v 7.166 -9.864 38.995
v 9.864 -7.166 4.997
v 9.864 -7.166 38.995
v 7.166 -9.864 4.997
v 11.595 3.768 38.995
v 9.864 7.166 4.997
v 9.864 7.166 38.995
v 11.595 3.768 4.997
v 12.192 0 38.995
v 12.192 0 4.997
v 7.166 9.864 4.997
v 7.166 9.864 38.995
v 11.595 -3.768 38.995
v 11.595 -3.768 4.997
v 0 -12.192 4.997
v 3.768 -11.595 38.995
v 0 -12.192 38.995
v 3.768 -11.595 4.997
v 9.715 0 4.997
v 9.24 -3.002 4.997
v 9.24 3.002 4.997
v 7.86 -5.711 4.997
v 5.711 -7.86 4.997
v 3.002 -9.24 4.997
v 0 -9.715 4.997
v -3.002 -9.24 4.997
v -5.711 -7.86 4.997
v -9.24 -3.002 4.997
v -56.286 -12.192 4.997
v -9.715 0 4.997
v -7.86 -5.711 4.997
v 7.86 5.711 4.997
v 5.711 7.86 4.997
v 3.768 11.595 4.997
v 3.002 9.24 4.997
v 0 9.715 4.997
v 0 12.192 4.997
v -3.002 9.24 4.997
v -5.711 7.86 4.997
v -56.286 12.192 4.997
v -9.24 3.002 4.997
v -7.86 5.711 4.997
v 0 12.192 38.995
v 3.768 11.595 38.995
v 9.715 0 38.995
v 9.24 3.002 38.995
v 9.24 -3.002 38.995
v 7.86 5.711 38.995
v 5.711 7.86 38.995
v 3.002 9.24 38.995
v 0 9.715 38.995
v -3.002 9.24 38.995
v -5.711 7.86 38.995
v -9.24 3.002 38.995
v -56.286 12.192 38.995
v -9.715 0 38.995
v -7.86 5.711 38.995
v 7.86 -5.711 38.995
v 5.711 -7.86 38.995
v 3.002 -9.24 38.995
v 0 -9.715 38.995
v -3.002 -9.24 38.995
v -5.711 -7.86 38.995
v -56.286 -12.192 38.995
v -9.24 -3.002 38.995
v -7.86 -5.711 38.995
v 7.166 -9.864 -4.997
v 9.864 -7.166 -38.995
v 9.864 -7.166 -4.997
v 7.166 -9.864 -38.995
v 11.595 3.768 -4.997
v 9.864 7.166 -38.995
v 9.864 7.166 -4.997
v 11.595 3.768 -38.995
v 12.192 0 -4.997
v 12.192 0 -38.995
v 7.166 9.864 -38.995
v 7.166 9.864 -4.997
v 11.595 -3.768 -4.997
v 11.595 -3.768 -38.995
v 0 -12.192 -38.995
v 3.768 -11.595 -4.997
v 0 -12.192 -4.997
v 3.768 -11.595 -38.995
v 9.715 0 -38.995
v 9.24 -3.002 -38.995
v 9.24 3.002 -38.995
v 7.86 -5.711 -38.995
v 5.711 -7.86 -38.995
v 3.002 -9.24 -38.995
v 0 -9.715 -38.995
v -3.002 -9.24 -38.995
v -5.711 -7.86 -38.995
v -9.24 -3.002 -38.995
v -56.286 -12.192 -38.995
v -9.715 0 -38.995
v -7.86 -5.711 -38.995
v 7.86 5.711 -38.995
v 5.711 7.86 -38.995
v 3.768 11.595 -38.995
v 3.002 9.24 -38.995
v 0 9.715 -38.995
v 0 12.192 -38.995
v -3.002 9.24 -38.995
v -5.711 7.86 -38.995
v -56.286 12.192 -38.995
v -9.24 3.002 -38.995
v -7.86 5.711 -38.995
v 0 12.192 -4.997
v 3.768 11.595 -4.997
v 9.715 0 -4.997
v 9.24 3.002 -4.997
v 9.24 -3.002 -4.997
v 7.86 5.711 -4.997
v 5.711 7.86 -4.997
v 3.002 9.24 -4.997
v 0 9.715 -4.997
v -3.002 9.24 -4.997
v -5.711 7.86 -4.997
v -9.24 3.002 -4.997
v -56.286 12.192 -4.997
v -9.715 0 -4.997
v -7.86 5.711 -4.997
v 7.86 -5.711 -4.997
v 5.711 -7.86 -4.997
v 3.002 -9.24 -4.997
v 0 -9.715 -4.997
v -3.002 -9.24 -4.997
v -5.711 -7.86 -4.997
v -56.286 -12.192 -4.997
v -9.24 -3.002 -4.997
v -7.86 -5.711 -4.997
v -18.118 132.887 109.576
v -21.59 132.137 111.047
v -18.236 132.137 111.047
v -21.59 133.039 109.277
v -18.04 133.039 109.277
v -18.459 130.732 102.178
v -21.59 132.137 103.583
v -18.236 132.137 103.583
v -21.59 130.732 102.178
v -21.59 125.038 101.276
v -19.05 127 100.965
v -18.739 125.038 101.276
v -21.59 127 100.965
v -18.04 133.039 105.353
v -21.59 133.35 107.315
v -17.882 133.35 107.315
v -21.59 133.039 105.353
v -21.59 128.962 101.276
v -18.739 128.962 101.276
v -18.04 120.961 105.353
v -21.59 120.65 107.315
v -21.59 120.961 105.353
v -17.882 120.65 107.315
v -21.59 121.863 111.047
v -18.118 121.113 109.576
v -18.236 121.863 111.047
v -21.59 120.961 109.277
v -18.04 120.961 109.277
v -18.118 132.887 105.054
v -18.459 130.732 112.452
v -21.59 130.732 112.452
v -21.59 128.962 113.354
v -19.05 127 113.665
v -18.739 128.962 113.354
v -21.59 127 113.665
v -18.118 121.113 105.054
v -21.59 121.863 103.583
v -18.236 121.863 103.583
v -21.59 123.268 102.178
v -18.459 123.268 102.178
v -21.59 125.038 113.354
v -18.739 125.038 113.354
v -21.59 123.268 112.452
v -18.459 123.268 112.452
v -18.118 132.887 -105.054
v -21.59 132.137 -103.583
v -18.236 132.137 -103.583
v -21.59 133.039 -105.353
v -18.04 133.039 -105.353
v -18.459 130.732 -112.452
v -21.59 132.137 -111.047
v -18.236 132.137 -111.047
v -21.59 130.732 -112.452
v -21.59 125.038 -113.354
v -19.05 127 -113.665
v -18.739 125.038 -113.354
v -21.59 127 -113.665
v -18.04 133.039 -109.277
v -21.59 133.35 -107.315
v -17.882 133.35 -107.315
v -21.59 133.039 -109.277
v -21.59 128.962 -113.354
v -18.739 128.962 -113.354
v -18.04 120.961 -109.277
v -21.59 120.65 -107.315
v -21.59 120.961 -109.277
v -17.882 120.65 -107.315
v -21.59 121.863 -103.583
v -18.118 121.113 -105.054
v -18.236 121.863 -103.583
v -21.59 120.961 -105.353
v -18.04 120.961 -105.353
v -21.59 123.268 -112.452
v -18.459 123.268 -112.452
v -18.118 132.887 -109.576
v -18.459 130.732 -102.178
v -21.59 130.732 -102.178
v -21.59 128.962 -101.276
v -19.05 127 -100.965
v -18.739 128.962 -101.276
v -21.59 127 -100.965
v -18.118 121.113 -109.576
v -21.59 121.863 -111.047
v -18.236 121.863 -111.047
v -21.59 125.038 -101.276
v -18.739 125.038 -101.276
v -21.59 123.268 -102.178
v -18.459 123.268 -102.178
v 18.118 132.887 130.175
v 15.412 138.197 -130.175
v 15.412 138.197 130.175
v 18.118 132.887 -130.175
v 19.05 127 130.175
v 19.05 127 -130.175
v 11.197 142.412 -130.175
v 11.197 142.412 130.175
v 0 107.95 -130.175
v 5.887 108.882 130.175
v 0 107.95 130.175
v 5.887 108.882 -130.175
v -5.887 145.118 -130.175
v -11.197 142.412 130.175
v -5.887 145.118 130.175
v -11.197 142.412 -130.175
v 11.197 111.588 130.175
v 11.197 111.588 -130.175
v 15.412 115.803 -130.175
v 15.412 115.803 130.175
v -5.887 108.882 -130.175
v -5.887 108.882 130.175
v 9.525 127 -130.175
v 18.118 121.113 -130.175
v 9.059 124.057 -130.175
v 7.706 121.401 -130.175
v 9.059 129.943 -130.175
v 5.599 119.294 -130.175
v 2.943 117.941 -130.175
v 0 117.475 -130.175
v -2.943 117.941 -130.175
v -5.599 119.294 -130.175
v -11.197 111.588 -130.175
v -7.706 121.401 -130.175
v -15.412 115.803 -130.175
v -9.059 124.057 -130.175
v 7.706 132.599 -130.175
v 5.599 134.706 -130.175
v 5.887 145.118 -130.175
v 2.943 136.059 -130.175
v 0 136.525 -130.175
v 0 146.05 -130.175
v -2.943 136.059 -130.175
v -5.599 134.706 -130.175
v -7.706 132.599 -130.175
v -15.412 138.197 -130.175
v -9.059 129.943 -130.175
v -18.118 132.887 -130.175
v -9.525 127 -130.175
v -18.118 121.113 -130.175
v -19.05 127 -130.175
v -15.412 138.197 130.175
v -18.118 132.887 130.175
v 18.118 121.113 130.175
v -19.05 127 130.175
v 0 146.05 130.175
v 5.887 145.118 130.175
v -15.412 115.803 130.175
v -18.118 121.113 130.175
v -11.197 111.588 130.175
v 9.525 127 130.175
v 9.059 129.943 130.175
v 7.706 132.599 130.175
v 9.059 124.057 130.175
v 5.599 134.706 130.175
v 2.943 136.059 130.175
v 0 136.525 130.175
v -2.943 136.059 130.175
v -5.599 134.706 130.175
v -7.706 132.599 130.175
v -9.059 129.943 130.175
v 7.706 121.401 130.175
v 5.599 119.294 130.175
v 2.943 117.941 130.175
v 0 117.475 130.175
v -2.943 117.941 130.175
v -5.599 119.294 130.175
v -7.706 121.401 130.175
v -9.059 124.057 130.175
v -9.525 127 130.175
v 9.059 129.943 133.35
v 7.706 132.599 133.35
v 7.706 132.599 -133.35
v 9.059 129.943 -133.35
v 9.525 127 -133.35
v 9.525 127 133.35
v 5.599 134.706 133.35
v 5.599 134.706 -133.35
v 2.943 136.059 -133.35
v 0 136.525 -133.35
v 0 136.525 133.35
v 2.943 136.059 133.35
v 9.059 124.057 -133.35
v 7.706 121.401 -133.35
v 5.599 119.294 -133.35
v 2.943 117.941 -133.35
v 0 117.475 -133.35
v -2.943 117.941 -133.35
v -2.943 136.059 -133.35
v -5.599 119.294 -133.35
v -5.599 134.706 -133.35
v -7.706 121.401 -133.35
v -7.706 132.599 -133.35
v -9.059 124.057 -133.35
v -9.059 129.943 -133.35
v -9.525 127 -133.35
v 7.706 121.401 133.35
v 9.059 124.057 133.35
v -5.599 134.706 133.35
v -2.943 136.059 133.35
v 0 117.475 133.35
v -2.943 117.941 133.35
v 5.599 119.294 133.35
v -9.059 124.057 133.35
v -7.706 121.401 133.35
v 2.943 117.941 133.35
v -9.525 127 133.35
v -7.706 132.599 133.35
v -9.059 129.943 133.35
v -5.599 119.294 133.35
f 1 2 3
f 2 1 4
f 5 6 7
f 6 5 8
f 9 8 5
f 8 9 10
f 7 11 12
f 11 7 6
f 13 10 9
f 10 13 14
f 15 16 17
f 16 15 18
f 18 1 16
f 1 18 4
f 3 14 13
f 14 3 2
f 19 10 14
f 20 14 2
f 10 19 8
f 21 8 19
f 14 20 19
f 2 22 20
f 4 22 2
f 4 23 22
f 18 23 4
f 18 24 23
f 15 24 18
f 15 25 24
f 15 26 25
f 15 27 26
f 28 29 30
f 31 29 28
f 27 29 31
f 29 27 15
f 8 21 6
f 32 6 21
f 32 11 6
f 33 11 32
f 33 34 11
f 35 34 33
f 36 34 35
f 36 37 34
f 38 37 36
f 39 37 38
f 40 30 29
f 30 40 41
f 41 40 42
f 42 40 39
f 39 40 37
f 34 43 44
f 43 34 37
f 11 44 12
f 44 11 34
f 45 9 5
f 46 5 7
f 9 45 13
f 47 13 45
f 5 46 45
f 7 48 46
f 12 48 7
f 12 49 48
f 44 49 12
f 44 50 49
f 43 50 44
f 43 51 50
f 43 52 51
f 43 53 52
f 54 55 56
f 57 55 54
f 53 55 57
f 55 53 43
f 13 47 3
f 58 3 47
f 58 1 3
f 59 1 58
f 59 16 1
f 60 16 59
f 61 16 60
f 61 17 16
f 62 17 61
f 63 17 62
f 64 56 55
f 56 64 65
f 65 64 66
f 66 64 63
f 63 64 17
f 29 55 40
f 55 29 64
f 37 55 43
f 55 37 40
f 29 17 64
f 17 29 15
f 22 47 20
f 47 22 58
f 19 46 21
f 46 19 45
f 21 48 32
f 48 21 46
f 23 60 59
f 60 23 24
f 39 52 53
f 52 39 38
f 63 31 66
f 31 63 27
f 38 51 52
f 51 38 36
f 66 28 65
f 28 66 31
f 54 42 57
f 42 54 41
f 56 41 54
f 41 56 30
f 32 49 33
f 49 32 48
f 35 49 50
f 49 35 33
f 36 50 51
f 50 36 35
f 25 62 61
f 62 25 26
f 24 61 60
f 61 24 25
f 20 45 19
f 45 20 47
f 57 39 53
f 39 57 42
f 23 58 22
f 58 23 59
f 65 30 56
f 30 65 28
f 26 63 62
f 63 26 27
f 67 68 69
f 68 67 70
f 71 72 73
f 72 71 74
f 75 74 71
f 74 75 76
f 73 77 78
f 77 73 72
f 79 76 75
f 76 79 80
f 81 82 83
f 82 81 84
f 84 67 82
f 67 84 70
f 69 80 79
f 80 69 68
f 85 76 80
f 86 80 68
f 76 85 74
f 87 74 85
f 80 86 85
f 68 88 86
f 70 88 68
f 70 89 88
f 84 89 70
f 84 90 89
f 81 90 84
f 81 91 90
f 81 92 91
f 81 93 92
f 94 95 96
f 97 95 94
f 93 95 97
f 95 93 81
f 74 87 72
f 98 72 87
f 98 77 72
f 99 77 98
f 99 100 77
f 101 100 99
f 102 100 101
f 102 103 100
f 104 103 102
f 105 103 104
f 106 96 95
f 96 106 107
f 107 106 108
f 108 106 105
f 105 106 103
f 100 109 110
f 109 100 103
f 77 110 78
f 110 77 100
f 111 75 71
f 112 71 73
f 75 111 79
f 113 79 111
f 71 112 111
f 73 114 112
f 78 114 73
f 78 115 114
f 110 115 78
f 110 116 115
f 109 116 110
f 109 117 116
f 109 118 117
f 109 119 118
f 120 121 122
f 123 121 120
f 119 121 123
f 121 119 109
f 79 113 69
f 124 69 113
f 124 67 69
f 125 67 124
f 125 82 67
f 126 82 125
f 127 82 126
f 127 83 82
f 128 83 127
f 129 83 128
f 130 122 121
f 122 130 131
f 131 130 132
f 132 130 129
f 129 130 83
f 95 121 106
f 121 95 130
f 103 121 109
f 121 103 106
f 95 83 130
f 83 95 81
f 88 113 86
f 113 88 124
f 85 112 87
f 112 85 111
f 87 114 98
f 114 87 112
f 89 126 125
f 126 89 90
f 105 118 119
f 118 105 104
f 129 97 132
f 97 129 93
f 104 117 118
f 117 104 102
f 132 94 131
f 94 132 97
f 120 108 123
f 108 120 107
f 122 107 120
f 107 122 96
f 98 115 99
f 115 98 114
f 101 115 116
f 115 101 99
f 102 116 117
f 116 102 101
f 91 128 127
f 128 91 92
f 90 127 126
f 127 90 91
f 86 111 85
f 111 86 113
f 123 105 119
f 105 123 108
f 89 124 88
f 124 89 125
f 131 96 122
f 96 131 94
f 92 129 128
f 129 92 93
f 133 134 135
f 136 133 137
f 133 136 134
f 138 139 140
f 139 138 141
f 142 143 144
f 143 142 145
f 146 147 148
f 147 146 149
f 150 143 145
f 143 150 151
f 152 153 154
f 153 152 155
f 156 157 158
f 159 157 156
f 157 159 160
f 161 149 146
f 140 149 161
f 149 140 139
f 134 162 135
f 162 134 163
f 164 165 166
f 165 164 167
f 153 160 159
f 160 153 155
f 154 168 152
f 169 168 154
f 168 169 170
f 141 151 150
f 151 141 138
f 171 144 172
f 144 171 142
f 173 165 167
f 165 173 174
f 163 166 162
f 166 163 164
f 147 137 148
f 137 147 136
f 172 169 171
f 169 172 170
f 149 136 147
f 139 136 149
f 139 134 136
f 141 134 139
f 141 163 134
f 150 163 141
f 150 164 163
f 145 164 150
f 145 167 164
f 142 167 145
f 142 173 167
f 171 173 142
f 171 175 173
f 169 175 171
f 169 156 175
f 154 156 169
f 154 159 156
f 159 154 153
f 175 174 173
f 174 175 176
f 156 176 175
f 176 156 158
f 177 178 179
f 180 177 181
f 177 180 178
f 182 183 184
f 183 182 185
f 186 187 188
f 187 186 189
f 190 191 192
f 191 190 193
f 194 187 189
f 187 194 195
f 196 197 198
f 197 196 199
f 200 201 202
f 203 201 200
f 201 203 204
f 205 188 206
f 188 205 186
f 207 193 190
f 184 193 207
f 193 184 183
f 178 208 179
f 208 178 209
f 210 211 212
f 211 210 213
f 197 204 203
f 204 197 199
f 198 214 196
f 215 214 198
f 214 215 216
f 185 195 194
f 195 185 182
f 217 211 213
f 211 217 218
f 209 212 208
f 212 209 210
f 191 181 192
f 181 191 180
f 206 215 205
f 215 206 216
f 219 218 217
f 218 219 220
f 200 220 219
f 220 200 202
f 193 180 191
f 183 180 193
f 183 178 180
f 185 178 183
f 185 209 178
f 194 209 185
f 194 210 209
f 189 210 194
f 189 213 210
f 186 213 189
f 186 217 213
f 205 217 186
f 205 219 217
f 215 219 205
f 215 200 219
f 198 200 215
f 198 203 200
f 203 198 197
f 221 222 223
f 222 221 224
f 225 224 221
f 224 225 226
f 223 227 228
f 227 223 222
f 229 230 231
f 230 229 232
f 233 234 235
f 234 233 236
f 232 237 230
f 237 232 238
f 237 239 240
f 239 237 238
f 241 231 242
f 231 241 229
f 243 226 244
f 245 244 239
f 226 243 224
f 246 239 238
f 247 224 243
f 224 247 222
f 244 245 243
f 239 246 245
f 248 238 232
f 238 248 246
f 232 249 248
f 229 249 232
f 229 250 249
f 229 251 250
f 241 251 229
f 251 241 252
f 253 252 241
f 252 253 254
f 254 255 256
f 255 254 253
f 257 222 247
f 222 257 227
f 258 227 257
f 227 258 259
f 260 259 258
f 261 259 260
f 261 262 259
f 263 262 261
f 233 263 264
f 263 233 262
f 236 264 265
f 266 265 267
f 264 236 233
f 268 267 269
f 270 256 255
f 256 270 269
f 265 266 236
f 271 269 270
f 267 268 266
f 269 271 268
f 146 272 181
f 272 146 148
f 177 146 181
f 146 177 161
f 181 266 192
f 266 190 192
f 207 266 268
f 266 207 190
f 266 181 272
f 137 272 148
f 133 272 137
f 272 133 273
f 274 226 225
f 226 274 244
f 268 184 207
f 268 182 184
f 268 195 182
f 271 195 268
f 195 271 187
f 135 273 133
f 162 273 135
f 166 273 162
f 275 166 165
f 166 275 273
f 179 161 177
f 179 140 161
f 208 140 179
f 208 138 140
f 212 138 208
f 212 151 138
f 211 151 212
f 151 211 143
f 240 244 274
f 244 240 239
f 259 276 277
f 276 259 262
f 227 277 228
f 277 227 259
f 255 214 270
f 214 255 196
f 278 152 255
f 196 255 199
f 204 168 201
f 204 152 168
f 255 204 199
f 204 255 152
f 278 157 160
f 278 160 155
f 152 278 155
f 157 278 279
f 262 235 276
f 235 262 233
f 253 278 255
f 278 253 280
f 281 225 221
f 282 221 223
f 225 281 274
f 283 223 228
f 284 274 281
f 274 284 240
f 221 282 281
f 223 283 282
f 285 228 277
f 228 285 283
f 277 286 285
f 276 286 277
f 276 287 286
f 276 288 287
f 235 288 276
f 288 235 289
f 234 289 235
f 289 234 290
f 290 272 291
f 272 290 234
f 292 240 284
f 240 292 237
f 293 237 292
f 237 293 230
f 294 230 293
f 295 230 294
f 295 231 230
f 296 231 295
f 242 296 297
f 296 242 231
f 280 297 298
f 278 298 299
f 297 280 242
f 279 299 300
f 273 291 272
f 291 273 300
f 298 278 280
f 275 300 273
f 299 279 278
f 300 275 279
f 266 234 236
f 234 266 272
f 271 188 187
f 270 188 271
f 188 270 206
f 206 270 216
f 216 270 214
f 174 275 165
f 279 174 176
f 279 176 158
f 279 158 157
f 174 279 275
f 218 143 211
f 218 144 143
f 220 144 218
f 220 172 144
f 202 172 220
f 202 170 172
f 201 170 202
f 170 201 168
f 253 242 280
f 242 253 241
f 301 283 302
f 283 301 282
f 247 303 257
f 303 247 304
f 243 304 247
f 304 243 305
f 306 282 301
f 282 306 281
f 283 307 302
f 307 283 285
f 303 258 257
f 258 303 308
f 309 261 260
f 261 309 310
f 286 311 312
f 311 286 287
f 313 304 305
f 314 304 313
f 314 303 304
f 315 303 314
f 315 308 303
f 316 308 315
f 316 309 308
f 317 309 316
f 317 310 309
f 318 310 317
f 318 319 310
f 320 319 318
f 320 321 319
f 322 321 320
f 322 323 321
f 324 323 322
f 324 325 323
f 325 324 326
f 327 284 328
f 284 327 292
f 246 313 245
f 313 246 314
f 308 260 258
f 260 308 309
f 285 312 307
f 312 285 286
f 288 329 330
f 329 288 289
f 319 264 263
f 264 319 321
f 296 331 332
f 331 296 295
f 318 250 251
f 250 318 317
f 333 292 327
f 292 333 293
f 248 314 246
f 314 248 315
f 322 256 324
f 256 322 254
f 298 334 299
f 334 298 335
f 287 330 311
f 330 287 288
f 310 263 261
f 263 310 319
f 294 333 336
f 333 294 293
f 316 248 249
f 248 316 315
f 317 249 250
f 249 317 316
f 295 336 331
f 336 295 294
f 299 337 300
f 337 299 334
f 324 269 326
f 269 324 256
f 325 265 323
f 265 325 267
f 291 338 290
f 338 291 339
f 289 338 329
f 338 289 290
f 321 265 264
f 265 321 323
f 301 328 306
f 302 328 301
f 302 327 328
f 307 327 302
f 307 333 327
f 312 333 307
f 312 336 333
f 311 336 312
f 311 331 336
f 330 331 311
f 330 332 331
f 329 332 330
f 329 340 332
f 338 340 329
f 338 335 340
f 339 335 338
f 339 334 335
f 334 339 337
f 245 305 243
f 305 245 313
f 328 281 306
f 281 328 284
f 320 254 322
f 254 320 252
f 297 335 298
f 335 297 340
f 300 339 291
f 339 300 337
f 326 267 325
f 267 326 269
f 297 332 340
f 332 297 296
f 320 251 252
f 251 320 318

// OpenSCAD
unit=25.4;
bore=1.5;
stroke=10.5;
a=10.250;
// rod diameter
d=0.75;
l=0.96;
r=0.765;
g=1.732;// determins height of m002
h=0.787;// determins height of m002
j=2.216;
k=2.125;
n=0.9;

/*Custom variables*/
//Z axis connection
z=g-h/2;
y=a-(n+n);

module main_mod(){
// Rod Connector construction
module m002(args) {
	module m001(args) {
		cylinder(d=l, h=z, center=true, $fn = 20 );
		translate([-j/2, 0, 0]) {
			cube(size=[j, l, z], center=true);
			//*[]set l x dimension
		}
	}

	difference() {
		m001();
		cylinder(d=r, h=z+10, center=true, $fn = 20);
	}
}

/*Body Cylinder connector
* [] related variables h, e
* [] Build this
*/

module rod(args) {
	cylinder(d=d, stroke, center=true, $fn=20);
}

// cylinder body
module m003(args) {

	//hydraulic ports construction
	module h_ports(args) {
		color("red")
		rotate([0,90,0])
		translate([0, 0, -bore/2])
		cylinder(d=0.5, h=0.2, center=true, $fn=20);
		}
		// *[] Fix this and add proper offset dimension to y
		translate([0,0,y/2])h_ports();
		translate([0,0,-y/2])h_ports();
		// main body cylinder
		cylinder(d=bore, h=a, center=true, $fn=20);
}

// Construct full connector with submodules
translate([0, 0, g/2])m002();
translate([0, 0, -g/2])m002();



// Construct full cylinder cylinder_body
translate([0, 5, 0]) {
	m003();
	color("lime")rod();
}




}
scale([unit, unit, unit]) {
	main_mod();
}


/* cylinder(d=l, h=h, center=true);
cylinder(d=r, h=h, center=true); */
